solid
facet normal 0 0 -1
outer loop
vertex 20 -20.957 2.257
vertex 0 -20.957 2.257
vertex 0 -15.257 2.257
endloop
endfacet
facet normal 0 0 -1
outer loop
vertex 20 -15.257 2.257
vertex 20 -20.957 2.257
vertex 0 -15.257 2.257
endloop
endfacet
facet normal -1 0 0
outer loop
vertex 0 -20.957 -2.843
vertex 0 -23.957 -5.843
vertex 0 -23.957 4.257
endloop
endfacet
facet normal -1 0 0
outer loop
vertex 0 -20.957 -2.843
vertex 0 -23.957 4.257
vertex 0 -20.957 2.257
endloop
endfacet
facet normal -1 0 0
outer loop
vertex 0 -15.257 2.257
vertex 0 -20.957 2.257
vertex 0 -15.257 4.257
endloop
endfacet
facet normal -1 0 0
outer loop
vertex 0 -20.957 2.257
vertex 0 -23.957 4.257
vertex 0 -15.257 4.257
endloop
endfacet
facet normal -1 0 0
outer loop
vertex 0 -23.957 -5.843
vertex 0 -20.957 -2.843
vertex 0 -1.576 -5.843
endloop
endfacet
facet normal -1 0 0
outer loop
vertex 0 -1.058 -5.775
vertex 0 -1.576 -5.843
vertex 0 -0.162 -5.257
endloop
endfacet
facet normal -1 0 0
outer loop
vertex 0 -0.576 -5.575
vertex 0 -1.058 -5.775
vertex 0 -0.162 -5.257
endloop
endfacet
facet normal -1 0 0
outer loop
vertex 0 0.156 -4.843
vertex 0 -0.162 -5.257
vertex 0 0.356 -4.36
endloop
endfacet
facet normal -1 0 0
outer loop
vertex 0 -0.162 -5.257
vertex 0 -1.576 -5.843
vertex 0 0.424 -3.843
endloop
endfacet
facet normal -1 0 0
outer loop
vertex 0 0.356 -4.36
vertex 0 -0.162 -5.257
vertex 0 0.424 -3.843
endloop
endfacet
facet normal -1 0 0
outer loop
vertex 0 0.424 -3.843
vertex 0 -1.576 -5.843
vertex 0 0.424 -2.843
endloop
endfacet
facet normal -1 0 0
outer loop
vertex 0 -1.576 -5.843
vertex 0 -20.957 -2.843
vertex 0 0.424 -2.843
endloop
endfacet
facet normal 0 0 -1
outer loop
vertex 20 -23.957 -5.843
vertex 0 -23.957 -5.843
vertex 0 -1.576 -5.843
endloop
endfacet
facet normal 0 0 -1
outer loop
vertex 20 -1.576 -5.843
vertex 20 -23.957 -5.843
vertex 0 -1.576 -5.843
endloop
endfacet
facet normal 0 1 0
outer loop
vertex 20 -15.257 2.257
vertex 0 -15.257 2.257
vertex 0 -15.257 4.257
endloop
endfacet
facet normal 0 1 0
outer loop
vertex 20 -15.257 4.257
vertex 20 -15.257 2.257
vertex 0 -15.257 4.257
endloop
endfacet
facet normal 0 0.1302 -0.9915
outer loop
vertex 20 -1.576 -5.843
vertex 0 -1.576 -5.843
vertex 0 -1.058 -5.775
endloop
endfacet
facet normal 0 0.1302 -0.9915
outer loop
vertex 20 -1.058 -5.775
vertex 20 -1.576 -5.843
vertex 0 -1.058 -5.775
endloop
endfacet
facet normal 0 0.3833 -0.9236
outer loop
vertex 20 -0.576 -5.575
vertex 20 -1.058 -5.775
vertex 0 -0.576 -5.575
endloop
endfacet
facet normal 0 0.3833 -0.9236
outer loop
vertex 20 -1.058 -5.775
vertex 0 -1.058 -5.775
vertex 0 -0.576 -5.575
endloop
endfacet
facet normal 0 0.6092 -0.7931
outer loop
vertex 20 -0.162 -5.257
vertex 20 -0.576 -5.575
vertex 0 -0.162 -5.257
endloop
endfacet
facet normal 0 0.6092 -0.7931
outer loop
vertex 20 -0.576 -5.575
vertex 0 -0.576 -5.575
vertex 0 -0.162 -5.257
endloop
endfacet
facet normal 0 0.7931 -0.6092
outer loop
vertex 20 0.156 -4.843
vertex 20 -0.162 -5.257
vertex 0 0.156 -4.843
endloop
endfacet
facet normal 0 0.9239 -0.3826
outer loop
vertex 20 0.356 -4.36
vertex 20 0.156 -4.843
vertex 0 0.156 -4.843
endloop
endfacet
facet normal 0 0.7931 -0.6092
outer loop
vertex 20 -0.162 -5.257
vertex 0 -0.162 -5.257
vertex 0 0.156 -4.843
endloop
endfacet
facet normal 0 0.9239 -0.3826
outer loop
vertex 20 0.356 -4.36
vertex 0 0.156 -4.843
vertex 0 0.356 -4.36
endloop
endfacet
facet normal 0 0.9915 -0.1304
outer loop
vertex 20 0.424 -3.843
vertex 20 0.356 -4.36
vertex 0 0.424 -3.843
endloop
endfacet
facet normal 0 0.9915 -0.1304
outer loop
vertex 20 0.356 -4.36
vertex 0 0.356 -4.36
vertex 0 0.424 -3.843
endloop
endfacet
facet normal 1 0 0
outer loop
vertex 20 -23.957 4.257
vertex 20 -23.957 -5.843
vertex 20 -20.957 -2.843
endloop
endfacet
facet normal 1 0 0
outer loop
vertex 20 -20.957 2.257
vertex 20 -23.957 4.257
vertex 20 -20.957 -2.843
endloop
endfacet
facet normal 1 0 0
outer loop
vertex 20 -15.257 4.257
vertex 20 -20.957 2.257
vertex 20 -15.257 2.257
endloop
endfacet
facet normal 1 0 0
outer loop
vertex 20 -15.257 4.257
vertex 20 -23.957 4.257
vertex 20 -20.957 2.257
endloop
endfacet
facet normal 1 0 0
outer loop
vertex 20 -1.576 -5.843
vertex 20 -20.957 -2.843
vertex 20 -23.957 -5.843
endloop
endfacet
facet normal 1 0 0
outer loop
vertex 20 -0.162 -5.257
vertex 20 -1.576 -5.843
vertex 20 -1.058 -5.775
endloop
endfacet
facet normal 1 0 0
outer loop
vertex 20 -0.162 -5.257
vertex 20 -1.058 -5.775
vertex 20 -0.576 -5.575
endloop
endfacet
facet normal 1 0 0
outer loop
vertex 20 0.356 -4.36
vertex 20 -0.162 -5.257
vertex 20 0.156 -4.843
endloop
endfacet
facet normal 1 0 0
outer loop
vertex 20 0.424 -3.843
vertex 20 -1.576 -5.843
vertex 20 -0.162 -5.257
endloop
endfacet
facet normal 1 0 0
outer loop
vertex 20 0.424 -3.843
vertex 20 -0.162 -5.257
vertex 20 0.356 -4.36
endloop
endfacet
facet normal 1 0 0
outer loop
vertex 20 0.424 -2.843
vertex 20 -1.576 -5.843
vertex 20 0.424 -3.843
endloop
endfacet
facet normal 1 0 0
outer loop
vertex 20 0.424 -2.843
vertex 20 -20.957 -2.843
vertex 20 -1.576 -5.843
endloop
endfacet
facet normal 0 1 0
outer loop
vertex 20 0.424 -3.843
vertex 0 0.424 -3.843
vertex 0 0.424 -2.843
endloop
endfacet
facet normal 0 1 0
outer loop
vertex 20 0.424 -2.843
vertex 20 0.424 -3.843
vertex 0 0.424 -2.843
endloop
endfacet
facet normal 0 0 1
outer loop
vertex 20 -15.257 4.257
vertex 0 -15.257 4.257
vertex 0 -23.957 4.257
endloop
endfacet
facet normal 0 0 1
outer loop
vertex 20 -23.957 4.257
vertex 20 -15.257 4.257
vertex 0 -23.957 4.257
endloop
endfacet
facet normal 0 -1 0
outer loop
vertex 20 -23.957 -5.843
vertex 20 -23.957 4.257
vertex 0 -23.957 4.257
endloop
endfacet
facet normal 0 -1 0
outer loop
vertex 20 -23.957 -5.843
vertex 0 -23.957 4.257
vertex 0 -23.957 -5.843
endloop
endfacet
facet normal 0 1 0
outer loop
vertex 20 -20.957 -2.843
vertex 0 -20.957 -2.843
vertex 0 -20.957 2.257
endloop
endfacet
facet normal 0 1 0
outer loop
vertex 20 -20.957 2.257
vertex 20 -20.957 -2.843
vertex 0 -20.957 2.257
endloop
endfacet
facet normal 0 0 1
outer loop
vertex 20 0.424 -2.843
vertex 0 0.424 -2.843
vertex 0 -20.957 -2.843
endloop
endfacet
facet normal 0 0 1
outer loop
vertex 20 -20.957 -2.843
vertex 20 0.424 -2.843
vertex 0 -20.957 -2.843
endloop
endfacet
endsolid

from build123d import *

# Parameters (mm, degrees)
F1_DEPTH = 20


with BuildPart() as f1:
    # F0 (on Right) → F1 (new body)
    with BuildSketch(Plane.YZ):
        with BuildLine():
            Line((-23.957143, -5.842857), (-1.575925, -5.842857))
            ThreePointArc((-1.575925, -5.842857), (-0.161711, -5.257071), (0.424075, -3.842857))
            Line((0.424075, -3.842857), (0.424075, -2.842857))
            Line((0.424075, -2.842857), (-20.957143, -2.842857))
            Line((-20.957143, -2.842857), (-20.957143, 2.257143))
            Line((-20.957143, 2.257143), (-15.257143, 2.257143))
            Line((-15.257143, 2.257143), (-15.257143, 4.257143))
            Line((-15.257143, 4.257143), (-23.957143, 4.257143))
            Line((-23.957143, 4.257143), (-23.957143, -5.842857))
        make_face()
    extrude(amount=F1_DEPTH)


solid = f1.part
